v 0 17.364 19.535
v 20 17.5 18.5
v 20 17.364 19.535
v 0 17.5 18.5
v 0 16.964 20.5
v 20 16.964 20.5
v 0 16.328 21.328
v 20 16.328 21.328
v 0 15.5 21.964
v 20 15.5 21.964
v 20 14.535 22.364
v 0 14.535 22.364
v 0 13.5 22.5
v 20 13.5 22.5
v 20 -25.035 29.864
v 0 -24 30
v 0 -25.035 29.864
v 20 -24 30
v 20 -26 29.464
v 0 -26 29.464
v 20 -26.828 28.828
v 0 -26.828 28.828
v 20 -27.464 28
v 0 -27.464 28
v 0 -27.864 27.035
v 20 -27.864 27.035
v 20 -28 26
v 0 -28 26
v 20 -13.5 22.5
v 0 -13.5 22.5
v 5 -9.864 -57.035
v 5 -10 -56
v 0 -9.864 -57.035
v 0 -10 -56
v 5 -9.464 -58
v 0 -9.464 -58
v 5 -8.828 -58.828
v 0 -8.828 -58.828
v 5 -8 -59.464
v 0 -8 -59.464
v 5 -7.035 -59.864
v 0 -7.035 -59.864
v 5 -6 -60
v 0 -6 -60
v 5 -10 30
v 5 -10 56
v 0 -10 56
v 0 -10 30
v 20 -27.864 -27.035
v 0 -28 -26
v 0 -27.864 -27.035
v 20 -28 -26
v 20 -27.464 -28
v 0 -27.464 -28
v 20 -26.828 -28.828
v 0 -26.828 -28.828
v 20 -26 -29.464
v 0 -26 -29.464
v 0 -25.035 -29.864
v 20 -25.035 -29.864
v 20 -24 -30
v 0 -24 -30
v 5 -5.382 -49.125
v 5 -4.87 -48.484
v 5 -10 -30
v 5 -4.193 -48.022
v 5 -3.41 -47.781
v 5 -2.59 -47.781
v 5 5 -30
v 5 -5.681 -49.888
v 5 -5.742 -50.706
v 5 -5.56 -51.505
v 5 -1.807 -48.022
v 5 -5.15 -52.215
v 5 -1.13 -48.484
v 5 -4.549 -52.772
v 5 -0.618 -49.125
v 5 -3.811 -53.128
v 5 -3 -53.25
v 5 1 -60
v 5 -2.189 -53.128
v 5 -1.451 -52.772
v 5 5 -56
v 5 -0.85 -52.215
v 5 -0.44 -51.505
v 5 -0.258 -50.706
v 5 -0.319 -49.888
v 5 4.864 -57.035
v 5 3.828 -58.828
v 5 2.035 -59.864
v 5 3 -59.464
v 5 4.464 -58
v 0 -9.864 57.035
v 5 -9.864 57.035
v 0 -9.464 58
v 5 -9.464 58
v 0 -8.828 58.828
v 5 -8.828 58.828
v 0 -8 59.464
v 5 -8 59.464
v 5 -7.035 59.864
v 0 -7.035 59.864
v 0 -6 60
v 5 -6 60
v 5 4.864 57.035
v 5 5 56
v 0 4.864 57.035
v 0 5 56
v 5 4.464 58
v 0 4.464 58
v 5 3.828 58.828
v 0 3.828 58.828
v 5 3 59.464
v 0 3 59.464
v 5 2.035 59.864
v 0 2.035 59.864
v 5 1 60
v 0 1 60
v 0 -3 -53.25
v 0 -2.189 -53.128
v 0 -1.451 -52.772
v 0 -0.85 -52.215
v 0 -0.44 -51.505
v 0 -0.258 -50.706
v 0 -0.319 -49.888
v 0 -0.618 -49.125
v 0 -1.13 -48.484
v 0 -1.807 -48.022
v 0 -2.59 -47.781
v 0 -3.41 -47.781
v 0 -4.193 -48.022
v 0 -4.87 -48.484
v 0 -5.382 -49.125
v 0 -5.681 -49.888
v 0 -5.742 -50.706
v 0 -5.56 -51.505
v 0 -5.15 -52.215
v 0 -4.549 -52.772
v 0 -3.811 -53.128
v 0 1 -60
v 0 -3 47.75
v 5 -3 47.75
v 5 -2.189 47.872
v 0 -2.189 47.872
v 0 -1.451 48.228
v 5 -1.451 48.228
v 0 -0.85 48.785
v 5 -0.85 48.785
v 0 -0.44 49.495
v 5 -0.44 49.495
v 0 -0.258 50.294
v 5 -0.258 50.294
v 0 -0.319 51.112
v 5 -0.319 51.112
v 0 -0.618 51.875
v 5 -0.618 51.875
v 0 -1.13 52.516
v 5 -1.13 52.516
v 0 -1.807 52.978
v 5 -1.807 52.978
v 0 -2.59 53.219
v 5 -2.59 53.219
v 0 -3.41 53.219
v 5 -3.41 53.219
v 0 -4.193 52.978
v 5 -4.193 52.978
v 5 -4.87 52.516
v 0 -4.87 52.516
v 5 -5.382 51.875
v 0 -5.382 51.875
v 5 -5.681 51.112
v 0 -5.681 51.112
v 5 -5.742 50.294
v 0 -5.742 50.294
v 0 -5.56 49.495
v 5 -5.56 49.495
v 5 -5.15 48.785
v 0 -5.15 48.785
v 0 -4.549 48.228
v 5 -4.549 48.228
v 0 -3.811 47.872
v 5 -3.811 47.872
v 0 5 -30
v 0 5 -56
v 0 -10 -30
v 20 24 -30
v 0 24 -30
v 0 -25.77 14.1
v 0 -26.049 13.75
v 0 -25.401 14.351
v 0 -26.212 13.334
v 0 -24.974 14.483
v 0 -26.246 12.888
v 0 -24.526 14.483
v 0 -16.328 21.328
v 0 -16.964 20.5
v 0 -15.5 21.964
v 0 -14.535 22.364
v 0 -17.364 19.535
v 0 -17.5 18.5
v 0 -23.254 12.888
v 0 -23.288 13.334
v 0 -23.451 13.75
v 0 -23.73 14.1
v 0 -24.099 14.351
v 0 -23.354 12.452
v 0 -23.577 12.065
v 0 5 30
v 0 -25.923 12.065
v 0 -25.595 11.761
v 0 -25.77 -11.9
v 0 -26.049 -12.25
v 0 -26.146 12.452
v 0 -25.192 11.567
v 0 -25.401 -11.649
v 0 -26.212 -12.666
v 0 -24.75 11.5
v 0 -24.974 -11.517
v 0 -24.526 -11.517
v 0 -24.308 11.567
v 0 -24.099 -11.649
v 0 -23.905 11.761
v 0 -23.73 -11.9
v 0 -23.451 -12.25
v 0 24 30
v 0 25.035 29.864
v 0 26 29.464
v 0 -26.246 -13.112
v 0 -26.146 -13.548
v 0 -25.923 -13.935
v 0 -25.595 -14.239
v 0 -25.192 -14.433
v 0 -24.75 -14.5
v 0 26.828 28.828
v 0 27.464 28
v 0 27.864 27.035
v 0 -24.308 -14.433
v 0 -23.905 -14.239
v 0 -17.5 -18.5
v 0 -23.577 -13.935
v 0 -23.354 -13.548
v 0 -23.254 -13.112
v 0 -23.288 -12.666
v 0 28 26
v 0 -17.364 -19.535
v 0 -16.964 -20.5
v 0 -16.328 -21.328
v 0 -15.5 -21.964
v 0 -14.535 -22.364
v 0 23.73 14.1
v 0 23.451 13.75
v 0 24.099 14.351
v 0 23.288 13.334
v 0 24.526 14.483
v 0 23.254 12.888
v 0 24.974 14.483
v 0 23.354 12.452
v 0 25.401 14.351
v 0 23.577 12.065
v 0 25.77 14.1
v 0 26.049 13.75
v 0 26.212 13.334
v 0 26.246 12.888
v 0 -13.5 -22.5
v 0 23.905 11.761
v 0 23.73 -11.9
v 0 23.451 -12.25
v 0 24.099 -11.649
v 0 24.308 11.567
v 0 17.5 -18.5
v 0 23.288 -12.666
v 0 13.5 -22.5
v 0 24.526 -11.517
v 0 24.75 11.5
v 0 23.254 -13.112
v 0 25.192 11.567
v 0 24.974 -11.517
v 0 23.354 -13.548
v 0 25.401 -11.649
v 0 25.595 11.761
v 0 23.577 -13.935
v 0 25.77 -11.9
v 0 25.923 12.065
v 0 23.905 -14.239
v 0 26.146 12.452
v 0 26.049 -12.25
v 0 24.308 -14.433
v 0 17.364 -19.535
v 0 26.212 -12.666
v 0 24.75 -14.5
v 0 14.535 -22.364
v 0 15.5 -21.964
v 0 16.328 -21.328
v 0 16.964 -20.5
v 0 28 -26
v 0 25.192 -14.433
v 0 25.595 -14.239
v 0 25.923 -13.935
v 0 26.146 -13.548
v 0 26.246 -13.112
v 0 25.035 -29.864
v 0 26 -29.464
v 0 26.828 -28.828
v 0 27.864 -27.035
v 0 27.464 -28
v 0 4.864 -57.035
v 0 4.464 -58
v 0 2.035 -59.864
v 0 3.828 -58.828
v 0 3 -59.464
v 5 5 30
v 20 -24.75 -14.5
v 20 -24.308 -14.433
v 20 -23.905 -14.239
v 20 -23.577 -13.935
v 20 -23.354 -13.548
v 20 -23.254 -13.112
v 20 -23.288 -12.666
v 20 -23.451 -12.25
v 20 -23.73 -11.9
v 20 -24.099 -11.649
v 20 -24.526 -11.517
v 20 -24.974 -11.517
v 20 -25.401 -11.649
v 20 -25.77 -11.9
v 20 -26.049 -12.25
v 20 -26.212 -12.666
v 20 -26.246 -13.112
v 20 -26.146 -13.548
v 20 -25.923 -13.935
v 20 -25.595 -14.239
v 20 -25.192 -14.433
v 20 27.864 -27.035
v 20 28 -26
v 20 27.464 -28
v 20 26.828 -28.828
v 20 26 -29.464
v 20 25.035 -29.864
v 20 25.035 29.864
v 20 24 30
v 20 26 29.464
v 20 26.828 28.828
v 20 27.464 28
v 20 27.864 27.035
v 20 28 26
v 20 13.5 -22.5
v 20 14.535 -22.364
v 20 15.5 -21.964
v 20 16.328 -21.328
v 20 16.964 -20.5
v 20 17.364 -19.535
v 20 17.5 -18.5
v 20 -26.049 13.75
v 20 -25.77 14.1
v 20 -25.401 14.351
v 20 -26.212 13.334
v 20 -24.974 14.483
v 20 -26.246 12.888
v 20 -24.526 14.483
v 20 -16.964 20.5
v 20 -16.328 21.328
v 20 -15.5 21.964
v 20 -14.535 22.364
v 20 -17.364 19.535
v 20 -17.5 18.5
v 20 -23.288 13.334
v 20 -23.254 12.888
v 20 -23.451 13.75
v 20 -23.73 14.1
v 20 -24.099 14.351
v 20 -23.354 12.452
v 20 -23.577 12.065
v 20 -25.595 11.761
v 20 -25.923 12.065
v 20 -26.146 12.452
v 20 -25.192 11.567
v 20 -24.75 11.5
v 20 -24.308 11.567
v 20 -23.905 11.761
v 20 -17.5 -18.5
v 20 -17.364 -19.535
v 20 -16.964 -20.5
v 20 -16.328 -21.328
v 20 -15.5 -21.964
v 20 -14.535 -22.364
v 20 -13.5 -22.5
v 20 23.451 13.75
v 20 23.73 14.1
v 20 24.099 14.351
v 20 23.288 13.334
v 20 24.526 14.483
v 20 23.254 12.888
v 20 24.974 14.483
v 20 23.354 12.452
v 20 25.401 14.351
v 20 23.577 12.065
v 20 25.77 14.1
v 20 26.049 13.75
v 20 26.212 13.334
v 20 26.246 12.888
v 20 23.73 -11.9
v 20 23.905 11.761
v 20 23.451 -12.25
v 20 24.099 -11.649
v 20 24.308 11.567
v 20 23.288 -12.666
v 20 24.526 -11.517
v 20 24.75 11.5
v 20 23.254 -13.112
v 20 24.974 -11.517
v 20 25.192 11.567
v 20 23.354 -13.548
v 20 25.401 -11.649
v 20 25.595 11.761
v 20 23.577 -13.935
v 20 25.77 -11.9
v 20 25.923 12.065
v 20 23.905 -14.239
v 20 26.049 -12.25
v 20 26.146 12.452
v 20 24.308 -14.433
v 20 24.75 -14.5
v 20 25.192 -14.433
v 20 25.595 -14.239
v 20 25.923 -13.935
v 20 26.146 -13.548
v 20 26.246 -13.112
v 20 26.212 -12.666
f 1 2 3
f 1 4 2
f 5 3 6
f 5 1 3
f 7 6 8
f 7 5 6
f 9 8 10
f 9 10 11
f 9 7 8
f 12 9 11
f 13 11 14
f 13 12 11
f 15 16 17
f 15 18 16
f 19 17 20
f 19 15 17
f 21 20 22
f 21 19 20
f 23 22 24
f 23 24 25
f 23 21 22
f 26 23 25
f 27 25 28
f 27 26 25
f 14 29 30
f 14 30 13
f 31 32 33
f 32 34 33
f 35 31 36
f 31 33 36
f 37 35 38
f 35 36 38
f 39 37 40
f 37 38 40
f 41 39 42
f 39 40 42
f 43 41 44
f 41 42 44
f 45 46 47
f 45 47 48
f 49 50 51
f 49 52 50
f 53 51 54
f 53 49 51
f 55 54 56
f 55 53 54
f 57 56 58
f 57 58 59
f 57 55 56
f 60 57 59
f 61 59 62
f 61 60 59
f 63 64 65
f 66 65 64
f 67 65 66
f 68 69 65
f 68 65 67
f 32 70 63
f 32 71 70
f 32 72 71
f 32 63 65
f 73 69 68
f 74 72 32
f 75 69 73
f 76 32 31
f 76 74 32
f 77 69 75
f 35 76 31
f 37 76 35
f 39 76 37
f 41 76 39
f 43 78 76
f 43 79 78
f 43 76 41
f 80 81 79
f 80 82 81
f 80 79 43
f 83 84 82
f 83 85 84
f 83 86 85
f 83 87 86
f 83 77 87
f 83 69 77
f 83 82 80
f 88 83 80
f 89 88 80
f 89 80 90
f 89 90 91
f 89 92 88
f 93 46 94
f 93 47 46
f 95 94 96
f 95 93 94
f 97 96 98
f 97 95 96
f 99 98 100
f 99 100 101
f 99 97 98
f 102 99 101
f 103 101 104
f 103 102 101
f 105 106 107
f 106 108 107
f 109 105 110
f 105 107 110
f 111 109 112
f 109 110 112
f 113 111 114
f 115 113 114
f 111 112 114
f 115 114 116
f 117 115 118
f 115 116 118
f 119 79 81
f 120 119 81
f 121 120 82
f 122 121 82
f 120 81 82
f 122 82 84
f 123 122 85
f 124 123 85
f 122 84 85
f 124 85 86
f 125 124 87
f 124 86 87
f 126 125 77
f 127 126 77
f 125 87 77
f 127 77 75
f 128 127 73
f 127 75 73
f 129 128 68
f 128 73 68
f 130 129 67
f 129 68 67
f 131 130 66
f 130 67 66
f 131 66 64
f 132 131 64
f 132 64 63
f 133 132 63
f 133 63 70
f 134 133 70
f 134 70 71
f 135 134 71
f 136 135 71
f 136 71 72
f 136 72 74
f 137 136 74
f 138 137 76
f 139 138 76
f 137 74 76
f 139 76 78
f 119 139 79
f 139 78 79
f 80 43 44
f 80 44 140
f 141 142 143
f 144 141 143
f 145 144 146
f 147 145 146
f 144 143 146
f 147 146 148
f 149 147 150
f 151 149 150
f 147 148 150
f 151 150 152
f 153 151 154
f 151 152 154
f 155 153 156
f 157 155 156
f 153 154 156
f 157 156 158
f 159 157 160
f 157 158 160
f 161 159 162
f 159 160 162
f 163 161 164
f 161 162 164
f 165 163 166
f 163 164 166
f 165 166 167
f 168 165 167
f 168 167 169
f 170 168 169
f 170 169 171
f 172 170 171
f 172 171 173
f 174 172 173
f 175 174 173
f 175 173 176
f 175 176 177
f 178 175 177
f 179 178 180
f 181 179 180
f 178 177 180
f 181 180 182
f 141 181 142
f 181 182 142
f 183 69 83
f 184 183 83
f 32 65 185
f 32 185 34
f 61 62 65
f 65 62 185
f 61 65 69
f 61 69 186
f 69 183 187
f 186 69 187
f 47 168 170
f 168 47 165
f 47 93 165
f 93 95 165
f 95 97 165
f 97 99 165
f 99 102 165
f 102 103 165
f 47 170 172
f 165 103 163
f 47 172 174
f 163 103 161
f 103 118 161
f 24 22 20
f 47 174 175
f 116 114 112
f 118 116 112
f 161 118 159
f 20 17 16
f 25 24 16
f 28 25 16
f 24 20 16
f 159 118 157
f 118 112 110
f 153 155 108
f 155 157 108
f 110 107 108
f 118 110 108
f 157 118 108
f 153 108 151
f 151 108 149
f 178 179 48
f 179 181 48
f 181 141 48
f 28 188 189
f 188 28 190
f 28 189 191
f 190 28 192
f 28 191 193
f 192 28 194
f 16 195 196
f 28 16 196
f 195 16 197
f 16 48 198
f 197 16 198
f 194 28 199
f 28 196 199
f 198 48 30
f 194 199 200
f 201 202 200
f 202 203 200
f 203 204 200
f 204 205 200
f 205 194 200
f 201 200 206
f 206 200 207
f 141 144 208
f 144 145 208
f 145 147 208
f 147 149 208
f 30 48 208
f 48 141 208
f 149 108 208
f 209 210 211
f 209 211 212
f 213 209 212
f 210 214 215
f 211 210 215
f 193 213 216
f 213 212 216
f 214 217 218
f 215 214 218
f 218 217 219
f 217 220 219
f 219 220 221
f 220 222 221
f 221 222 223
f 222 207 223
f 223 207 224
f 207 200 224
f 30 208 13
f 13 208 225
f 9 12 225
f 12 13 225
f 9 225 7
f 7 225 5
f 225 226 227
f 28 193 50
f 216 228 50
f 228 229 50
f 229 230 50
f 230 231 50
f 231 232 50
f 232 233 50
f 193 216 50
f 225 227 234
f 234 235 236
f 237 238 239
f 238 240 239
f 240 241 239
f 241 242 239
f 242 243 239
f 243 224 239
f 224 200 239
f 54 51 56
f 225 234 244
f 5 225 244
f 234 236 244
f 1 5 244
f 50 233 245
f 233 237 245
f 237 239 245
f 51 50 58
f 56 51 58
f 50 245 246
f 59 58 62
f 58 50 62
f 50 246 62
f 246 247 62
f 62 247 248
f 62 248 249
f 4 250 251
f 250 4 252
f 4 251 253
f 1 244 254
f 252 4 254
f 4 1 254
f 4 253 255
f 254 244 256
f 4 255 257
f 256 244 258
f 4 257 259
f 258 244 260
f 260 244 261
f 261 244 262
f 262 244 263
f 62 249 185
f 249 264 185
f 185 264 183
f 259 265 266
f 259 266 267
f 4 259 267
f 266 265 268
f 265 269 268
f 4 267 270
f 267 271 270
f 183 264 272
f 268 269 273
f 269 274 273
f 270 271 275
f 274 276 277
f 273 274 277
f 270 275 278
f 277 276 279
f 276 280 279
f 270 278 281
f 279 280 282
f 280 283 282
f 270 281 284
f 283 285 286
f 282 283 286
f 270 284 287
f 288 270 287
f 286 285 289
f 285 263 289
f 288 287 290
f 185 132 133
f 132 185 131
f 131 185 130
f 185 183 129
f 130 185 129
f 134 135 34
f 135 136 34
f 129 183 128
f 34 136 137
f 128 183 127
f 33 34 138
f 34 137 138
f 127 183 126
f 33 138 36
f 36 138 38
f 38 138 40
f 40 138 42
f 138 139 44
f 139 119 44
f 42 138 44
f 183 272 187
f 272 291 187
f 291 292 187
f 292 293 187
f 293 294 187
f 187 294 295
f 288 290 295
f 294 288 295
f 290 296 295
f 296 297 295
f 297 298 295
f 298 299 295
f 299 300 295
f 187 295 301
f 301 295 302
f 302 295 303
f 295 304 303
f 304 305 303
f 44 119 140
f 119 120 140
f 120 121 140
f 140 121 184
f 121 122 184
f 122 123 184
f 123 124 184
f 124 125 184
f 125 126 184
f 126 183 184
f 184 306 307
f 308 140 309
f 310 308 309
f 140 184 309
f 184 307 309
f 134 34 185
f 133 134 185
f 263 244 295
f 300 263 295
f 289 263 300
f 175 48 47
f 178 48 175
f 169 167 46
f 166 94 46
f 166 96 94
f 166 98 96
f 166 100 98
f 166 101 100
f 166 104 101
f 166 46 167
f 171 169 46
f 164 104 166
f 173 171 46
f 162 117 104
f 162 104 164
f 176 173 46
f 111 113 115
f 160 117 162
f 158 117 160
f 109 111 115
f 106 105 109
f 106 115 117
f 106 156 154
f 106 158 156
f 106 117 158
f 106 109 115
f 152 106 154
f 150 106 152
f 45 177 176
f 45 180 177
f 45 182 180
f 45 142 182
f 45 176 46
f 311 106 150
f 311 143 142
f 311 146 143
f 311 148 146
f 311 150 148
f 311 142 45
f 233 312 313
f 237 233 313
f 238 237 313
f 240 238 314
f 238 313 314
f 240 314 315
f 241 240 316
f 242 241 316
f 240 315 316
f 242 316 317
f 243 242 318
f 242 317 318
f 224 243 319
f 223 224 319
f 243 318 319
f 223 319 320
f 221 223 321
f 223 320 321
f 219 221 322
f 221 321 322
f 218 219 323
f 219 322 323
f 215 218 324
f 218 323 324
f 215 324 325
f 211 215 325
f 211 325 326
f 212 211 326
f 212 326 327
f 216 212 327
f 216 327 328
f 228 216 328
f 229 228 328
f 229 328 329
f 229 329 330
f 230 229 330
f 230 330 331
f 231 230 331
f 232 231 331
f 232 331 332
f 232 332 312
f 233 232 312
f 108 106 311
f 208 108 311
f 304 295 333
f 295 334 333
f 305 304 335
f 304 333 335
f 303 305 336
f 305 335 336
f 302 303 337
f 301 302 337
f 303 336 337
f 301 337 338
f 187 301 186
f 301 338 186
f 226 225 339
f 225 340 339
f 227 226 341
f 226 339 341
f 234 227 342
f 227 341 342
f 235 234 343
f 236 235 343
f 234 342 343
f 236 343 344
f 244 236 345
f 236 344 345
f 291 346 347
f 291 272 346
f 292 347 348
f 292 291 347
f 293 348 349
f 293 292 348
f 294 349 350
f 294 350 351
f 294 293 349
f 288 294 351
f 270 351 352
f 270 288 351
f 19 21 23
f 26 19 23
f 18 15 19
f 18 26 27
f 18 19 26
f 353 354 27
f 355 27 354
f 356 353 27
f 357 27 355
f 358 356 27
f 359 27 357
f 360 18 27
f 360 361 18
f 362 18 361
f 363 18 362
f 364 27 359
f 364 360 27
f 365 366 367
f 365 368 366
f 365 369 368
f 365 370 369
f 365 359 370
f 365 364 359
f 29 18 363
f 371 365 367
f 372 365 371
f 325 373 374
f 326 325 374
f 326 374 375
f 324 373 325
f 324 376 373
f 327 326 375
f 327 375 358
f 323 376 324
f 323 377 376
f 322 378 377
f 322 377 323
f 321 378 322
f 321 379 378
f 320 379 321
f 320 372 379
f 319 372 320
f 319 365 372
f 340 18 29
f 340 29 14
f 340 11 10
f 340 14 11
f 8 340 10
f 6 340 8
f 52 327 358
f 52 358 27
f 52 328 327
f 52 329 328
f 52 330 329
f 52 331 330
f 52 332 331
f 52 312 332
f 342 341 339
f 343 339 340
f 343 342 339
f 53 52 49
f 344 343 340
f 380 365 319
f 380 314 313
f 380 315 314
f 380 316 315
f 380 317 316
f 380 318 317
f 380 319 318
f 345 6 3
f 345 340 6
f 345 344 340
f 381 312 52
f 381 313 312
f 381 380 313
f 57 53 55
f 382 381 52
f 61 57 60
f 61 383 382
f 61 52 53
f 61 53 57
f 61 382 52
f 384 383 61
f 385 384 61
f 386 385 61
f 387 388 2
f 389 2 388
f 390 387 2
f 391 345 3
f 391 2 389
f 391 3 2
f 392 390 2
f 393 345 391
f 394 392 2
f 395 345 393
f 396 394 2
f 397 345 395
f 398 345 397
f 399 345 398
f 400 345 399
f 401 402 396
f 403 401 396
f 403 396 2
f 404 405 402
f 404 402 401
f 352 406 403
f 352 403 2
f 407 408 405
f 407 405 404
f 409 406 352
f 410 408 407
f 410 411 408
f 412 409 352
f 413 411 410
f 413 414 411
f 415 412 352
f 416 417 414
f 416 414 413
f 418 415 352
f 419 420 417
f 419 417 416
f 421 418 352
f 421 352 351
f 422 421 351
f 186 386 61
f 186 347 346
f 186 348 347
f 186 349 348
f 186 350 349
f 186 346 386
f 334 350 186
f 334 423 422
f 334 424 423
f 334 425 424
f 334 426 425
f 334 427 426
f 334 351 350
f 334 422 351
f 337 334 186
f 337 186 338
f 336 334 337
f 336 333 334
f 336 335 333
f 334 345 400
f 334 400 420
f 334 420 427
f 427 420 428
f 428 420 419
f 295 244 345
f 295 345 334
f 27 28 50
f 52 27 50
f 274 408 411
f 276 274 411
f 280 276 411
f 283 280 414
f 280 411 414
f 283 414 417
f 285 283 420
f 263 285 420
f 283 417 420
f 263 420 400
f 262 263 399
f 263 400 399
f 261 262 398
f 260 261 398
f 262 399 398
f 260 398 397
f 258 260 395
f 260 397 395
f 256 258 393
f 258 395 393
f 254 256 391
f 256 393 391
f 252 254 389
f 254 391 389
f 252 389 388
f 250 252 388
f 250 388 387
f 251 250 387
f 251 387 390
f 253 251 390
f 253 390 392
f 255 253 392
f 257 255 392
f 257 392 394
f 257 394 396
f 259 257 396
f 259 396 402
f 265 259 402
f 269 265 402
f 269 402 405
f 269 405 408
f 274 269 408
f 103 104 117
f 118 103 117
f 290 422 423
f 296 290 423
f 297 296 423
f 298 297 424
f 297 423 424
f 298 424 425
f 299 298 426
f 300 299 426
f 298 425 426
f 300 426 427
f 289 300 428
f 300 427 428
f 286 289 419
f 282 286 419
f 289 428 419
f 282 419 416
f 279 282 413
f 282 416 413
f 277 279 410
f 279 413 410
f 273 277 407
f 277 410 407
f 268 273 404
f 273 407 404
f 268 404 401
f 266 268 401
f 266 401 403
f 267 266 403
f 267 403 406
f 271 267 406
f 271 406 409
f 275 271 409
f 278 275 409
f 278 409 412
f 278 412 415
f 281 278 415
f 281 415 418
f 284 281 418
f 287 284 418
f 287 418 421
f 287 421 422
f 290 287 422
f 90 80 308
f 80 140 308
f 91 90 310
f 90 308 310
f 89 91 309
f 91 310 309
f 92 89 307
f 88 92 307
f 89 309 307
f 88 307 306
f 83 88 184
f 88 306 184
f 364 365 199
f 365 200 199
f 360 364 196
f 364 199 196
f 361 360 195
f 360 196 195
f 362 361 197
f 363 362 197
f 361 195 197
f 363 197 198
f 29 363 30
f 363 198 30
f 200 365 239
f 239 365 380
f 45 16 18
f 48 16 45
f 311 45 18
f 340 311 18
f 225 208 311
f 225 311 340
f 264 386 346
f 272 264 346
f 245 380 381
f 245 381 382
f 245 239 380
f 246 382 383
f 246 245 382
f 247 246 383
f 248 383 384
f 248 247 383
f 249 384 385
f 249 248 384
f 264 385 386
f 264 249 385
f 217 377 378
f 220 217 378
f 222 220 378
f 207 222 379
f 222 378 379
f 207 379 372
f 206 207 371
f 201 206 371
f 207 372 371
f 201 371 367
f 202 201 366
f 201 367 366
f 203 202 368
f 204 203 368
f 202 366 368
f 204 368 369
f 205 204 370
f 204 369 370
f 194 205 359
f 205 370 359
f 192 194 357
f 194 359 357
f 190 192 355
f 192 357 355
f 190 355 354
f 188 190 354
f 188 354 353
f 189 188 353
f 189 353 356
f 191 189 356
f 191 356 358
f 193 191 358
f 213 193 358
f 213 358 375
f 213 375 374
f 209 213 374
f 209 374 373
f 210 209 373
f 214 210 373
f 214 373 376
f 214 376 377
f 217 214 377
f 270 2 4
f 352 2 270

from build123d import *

# Parameters (mm, degrees)
SKETCH_1_W          = 60
SKETCH_1_H          = 56
EXTRUDE_1_DEPTH     = 20
EXTRUDE_START       = -15
SKETCH_6_W          = 30
SKETCH_6_H          = 15
EXTRUDE_3_DEPTH     = 5
SKETCH_7_R          = 1.5
CUT_EXTRUDE_2_DEPTH = 70.166465863
CUT_EXTRUDE_START   = -15
SKETCH_8_R          = 2.75
CUT_EXTRUDE_3_DEPTH = 5
FILLET_2_R          = 4
SKETCH_9_W          = 45
SKETCH_9_H          = 35
CUT_EXTRUDE_4_DEPTH = 70.166465863
FILLET_3_R          = 4


with BuildPart() as part:
    # 草图1 → 凸台-拉伸1 (new body)
    with BuildSketch(Plane(origin=(0, 0, 0), x_dir=(0, 0, -1), z_dir=(1, 0, 0))):
        Rectangle(SKETCH_1_W, SKETCH_1_H)
    extrude(amount=EXTRUDE_1_DEPTH)

    # 草图6 → 凸台-拉伸3 (add)
    with BuildSketch(Plane(origin=(20, 0, 0), x_dir=(0, 0, -1), z_dir=(1, 0, 0)).offset(EXTRUDE_START)):
        with Locations((45, -2.5)):
            Rectangle(SKETCH_6_W, SKETCH_6_H)
        with Locations((-45, -2.5)):
            Rectangle(SKETCH_6_W, SKETCH_6_H)
    extrude(amount=-EXTRUDE_3_DEPTH)

    # 草图7 → 切除-拉伸2 (cut, through all)
    with BuildSketch(Plane(origin=(20, 0, 0), x_dir=(0, 0, -1), z_dir=(1, 0, 0))):
        with Locations((-13, 24.75)):
            Circle(SKETCH_7_R)
        with Locations((13, 24.75)):
            Circle(SKETCH_7_R)
        with Locations((13, -24.75)):
            Circle(SKETCH_7_R)
        with Locations((-13, -24.75)):
            Circle(SKETCH_7_R)
    extrude(amount=-CUT_EXTRUDE_2_DEPTH, mode=Mode.SUBTRACT)

    # 草图8 → 切除-拉伸3 (cut)
    with BuildSketch(Plane(origin=(20, 0, 0), x_dir=(0, 0, -1), z_dir=(1, 0, 0)).offset(CUT_EXTRUDE_START)):
        with Locations((-50.5, -3)):
            Circle(SKETCH_8_R)
        with Locations((50.5, -3)):
            Circle(SKETCH_8_R)
    extrude(amount=-CUT_EXTRUDE_3_DEPTH, mode=Mode.SUBTRACT)

    # 圆角2
    fillet_2_edges = [part.edges().sort_by_distance(p)[0] for p in [
        (2.5, 5, -60),
        (2.5, -10, -60),
        (2.5, -10, 60),
        (2.5, 5, 60),
        (10, 28, 30),
        (10, 28, -30),
        (10, -28, -30),
        (10, -28, 30),
    ]]
    fillet(fillet_2_edges, radius=FILLET_2_R)

    # 草图9 → 切除-拉伸4 (cut, through all)
    with BuildSketch(Plane(origin=(20, 0, 0), x_dir=(0, 0, -1), z_dir=(1, 0, 0))):
        Rectangle(SKETCH_9_W, SKETCH_9_H)
    extrude(amount=-CUT_EXTRUDE_4_DEPTH, mode=Mode.SUBTRACT)

    # 圆角3
    fillet_3_edges = [part.edges().sort_by_distance(p)[0] for p in [
        (10, -17.5, 22.5),
        (10, 17.5, 22.5),
        (10, 17.5, -22.5),
        (10, -17.5, -22.5),
    ]]
    fillet(fillet_3_edges, radius=FILLET_3_R)


solid = part.part
